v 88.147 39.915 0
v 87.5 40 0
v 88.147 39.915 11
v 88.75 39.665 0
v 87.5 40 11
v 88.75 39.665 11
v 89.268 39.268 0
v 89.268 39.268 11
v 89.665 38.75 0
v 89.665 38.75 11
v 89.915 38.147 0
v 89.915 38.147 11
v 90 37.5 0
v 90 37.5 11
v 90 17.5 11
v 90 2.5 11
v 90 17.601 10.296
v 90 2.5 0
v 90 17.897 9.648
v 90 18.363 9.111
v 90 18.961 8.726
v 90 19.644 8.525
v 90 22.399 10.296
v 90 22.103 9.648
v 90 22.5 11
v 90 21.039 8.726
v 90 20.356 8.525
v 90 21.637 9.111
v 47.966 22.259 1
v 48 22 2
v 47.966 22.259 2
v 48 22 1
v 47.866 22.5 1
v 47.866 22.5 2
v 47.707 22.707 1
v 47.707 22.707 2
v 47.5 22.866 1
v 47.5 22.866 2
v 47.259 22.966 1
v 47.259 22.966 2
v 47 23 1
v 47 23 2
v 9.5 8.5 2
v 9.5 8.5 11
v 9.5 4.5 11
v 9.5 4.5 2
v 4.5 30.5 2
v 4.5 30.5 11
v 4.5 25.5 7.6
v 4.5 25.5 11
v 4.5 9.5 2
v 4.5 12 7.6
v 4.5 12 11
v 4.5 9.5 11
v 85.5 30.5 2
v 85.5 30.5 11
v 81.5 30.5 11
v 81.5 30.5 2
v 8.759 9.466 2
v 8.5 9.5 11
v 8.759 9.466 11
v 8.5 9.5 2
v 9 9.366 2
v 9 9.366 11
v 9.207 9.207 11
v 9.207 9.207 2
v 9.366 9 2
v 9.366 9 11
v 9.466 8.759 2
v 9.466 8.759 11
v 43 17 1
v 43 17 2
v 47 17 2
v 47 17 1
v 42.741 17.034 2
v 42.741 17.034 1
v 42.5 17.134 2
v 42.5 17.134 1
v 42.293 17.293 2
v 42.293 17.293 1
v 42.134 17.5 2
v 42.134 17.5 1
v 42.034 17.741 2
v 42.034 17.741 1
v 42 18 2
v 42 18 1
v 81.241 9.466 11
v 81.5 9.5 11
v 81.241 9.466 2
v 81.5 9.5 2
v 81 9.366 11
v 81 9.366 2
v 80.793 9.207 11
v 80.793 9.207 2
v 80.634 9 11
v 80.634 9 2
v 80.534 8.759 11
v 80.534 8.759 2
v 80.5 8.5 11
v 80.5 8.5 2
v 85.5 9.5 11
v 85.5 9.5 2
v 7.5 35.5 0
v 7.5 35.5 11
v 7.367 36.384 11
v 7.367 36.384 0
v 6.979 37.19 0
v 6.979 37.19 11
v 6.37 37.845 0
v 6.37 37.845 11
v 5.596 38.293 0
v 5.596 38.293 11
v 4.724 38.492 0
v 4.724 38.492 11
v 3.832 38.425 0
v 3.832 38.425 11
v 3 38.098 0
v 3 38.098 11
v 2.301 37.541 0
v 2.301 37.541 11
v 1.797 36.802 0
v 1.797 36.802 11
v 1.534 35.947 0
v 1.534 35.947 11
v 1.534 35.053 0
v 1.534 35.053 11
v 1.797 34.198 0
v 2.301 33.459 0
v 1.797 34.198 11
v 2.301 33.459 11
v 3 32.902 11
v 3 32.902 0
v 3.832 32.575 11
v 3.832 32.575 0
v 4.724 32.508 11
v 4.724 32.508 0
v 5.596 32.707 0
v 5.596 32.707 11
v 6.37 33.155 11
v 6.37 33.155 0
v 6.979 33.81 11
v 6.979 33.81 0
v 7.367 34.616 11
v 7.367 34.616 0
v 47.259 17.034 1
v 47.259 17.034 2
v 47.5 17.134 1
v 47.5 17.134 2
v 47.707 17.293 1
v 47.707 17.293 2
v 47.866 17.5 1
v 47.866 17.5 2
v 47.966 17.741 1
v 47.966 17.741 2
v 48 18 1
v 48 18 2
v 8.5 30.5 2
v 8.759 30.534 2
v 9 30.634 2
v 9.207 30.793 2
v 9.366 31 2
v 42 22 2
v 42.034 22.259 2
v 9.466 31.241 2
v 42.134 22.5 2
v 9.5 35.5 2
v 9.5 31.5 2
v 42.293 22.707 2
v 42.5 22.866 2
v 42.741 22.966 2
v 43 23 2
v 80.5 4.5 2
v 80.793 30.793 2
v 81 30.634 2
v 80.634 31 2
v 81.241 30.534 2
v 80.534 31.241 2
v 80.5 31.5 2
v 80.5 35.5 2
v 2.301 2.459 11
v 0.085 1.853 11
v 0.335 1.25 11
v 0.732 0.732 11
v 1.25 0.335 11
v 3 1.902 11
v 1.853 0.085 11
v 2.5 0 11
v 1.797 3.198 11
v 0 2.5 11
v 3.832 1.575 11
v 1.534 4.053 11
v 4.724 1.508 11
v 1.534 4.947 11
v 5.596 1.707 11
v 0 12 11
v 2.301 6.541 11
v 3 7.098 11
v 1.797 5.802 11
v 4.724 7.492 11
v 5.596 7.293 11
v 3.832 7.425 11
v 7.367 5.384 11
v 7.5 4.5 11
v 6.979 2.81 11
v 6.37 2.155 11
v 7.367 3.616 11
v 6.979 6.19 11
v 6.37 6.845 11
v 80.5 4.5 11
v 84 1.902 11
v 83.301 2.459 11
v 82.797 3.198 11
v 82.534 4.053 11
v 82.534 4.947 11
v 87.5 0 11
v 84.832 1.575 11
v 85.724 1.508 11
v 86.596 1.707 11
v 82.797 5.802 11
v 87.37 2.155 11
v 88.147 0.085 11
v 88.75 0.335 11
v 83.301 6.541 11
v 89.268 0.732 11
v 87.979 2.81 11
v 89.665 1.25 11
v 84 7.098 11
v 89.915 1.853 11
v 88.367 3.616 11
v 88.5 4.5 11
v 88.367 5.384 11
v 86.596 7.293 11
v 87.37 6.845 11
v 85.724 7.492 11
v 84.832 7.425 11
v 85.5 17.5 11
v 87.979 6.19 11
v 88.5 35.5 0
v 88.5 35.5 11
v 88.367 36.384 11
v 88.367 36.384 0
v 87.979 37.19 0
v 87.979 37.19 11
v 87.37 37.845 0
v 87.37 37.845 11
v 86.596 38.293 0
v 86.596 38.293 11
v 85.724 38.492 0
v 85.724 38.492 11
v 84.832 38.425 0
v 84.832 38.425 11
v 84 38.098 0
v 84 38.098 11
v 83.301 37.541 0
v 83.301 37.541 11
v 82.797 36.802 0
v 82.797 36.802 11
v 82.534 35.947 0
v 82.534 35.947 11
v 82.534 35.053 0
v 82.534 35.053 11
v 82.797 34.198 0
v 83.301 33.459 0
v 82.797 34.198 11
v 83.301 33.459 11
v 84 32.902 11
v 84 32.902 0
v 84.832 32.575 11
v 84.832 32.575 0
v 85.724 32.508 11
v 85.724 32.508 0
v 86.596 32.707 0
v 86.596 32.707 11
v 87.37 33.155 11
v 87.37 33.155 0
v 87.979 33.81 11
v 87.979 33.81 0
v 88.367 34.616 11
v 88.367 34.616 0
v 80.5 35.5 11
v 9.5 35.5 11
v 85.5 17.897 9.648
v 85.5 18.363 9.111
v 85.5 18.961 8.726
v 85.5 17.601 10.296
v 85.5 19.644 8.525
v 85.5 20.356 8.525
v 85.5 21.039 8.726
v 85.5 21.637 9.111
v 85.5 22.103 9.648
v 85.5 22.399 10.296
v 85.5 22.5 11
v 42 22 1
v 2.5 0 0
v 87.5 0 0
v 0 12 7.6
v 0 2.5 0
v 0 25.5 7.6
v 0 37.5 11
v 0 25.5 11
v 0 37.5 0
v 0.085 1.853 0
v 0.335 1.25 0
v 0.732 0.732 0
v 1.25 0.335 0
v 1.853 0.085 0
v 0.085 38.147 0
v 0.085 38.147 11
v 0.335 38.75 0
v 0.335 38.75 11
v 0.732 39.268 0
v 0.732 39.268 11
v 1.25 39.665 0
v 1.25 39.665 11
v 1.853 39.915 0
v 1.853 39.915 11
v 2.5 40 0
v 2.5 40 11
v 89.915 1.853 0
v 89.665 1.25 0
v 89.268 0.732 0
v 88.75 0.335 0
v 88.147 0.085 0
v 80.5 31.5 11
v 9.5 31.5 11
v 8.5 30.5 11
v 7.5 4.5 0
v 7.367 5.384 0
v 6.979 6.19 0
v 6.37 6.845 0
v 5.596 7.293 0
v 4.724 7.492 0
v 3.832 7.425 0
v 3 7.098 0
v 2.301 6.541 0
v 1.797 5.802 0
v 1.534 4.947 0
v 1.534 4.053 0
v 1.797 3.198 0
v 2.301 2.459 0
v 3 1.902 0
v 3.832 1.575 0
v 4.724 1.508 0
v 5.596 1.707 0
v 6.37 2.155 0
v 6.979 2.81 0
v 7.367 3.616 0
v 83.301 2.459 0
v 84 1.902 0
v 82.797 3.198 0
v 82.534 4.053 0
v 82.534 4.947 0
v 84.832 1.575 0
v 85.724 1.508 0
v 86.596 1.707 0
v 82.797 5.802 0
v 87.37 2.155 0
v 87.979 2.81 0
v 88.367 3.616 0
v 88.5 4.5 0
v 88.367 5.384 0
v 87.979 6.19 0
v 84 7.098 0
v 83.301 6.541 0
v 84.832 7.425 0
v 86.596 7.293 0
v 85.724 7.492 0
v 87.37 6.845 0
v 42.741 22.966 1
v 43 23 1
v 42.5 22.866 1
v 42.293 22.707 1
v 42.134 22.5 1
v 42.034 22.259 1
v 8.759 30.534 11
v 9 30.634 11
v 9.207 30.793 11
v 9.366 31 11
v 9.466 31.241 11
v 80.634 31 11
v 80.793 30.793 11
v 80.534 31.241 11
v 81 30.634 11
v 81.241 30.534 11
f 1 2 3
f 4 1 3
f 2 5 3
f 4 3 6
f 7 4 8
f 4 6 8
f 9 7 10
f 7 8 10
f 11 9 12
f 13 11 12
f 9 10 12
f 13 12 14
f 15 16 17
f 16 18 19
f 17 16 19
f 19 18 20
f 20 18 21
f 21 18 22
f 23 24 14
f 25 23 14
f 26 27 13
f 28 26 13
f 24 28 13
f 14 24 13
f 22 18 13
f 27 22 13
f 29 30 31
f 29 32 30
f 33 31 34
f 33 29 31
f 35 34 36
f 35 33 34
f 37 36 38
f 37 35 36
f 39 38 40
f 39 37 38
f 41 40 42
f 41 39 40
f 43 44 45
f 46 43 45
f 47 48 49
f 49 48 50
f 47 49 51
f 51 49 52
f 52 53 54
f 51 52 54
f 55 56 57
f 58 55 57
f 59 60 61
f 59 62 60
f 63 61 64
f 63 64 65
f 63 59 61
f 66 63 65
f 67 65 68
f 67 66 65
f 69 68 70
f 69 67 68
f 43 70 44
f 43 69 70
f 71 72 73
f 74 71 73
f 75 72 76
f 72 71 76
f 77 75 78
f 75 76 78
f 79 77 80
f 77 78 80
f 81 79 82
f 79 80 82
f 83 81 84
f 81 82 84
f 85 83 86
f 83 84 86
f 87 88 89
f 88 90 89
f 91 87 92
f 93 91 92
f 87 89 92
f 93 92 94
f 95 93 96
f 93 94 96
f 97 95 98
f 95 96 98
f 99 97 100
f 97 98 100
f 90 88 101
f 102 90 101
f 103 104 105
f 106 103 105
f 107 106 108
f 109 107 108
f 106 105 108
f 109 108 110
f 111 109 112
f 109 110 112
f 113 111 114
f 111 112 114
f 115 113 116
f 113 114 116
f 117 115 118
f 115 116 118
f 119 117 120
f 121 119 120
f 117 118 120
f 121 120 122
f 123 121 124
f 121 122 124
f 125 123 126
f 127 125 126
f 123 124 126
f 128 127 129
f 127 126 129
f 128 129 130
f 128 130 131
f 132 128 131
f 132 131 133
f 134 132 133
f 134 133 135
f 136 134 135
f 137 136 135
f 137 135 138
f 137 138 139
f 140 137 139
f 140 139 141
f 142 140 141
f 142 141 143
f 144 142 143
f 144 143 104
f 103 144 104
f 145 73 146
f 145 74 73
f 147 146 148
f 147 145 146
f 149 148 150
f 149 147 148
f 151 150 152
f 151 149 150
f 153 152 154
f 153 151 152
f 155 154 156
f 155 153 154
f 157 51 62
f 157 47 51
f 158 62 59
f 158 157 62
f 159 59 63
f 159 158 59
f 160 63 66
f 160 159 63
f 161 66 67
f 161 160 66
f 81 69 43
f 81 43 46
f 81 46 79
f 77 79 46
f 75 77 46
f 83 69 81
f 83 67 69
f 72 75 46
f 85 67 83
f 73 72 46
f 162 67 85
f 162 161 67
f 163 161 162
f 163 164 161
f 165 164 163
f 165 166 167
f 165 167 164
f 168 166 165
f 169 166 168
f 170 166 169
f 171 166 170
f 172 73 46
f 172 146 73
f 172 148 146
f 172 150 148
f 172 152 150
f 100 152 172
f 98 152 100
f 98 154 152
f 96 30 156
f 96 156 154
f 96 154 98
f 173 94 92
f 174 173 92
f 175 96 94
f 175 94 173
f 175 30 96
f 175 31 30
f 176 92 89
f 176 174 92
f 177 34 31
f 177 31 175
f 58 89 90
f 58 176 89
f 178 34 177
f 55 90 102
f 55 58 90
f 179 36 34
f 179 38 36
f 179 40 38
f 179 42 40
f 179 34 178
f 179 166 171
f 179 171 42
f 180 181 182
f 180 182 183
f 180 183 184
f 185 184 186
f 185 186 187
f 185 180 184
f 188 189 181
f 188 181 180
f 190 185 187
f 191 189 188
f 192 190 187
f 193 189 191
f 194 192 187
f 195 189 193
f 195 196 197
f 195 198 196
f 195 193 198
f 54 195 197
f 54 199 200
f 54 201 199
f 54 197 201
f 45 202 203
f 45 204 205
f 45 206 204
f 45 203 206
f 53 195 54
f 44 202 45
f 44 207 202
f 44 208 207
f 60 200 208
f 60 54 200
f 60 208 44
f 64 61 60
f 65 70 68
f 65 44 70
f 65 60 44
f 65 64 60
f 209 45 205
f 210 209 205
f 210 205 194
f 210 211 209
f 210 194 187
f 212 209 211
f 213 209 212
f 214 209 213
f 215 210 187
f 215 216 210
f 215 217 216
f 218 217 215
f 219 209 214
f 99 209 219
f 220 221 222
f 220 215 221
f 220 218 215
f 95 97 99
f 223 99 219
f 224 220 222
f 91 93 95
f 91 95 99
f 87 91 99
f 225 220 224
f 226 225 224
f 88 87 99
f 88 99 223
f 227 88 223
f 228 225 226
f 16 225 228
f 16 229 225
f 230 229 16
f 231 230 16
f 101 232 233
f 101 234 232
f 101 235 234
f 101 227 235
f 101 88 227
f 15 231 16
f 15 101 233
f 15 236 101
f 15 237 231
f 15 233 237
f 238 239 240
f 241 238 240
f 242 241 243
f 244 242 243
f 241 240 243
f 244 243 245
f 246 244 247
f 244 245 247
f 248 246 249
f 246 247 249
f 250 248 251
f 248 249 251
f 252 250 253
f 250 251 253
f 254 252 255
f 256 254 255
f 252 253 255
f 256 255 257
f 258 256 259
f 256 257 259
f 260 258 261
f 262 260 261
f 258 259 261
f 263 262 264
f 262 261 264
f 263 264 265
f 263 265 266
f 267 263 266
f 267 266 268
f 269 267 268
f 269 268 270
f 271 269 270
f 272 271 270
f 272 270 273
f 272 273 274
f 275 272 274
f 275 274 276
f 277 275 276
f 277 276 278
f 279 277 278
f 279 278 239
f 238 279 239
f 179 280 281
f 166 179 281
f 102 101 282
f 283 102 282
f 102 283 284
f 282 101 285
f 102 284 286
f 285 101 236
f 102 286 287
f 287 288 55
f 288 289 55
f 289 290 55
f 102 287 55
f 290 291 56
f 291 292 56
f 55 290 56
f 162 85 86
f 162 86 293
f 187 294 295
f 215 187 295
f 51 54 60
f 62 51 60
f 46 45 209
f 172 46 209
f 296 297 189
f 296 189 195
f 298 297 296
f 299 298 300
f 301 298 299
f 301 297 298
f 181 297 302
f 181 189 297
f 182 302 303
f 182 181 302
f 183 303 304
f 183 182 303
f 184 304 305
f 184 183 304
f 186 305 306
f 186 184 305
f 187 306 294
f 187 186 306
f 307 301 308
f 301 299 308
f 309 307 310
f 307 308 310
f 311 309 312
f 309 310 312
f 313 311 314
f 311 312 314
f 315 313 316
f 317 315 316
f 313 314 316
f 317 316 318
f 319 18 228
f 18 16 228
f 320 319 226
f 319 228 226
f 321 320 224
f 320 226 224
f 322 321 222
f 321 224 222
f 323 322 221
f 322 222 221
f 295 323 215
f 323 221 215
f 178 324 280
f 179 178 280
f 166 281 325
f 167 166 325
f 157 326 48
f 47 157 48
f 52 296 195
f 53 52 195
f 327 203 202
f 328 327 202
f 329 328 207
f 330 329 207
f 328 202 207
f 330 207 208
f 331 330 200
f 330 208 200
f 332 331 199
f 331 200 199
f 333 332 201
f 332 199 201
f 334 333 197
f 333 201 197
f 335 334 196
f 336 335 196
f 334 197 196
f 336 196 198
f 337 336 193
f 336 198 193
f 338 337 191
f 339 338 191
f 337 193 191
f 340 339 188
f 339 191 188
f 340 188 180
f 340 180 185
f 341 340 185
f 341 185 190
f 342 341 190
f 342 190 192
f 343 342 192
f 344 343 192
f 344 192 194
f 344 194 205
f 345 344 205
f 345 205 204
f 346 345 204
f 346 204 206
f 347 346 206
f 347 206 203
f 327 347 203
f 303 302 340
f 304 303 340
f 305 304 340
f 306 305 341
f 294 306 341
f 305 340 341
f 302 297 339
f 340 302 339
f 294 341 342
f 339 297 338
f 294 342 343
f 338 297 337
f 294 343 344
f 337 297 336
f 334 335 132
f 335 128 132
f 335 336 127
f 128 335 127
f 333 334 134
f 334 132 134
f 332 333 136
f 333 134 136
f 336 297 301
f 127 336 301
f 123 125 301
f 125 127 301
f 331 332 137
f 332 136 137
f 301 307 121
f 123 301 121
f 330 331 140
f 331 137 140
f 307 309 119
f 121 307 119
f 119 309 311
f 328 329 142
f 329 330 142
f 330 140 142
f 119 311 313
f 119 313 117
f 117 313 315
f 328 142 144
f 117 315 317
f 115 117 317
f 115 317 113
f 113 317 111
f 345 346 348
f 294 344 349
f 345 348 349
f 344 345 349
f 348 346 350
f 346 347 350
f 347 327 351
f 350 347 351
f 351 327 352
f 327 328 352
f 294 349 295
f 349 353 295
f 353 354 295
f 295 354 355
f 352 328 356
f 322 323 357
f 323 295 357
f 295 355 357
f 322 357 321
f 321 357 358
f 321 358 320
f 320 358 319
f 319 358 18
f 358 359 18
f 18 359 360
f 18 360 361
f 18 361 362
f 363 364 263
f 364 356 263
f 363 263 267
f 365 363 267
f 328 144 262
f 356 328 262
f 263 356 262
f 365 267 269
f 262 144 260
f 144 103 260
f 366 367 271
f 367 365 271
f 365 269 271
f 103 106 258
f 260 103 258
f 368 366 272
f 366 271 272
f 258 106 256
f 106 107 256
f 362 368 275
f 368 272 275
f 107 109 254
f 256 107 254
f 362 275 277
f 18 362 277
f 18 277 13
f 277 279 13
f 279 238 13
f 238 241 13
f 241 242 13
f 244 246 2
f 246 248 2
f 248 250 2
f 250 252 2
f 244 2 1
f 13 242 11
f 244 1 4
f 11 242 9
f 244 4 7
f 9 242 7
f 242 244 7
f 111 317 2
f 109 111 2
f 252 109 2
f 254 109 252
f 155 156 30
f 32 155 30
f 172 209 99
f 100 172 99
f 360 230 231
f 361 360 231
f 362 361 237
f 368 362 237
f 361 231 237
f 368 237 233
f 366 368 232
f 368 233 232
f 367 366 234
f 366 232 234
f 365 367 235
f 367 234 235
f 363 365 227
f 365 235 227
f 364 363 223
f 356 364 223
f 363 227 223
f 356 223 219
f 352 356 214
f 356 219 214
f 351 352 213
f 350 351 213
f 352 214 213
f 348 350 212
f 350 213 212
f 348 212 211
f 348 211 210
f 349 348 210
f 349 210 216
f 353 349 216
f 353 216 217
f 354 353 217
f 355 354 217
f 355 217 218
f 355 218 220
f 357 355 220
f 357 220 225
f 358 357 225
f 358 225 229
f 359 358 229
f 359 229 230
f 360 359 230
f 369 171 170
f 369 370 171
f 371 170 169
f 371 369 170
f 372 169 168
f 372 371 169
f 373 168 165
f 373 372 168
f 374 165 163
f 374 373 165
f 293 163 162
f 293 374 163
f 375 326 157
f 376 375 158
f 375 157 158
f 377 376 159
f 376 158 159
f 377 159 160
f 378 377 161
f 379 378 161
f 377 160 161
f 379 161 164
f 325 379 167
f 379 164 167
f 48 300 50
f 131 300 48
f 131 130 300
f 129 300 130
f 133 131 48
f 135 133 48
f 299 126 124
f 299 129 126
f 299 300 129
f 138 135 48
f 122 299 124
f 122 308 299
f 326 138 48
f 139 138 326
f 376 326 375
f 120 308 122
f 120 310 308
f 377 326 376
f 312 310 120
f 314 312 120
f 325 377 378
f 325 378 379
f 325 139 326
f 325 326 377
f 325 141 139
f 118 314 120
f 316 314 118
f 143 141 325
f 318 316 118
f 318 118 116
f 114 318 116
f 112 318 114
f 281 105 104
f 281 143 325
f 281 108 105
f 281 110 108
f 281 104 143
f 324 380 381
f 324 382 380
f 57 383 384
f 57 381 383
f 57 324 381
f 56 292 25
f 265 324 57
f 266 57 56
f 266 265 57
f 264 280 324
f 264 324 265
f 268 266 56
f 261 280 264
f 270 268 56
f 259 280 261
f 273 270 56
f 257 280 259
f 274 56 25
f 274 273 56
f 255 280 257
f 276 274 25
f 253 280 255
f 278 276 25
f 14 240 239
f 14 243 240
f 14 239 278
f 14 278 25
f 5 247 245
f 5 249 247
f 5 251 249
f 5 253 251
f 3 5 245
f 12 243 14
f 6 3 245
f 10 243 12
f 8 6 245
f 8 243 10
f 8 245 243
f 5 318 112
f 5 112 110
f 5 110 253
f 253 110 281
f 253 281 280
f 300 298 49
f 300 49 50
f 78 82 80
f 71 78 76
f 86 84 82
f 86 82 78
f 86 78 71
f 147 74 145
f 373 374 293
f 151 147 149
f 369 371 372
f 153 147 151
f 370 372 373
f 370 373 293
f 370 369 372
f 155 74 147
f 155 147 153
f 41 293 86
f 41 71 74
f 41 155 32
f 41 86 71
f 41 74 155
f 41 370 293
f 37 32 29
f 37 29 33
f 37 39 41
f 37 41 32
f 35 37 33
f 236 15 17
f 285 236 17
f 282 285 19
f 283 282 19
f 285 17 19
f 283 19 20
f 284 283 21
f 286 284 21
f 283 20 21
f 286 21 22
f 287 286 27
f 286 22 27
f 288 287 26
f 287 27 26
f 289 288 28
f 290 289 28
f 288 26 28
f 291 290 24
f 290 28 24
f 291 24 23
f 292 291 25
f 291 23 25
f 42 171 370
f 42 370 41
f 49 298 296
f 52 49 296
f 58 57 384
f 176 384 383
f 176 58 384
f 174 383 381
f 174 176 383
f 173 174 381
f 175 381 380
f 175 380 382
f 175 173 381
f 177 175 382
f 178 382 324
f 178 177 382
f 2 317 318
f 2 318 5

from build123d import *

# Parameters (mm, degrees)
SKETCH_W        = 90
SKETCH_H        = 40
PAD_DEPTH       = 11
POCKET_DEPTH    = 9
POCKET001_DEPTH = 6
SKETCH003_W     = 13.5
SKETCH003_H     = 3.4
POCKET002_DEPTH = 6
SKETCH005_R     = 3
HOLE_DEPTH      = 25
FILLET_R        = 1
FILLET001_R     = 2.5
SKETCH007_W     = 6
SKETCH007_H     = 6
POCKET003_DEPTH = 1
FILLET002_R     = 1


with BuildPart() as part:
    # Sketch → Pad (new body)
    with BuildSketch(Plane.XY):
        with Locations((45, 20)):
            Rectangle(SKETCH_W, SKETCH_H)
    extrude(amount=PAD_DEPTH)

    # Sketch001 (on Face6 of Pad) → Pocket (cut)
    with BuildSketch(Plane.XY.offset(11)):
        Polygon((4.5, 30.5), (4.5, 9.5), (9.5, 9.5), (9.5, 4.5), (80.5, 4.5), (80.5, 9.5), (85.5, 9.5), (85.5, 30.5), (80.5, 30.5), (80.5, 35.5), (9.5, 35.5), (9.5, 30.5), align=None)
    extrude(amount=-POCKET_DEPTH, mode=Mode.SUBTRACT)

    # Sketch002 (on Face6 of Pocket) → Pocket001 (cut)
    with BuildSketch(Plane.YZ.offset(90)):
        with BuildLine():
            ThreePointArc((17.5, 11), (20, 8.499988), (22.5, 11))
            Line((17.5, 11), (22.5, 11))
        make_face()
    extrude(amount=-POCKET001_DEPTH, mode=Mode.SUBTRACT)

    # Sketch003 (on Face1 of Pocket001) → Pocket002 (cut)
    with BuildSketch(Plane(origin=(0, 0, 0), x_dir=(0, -1, 0), z_dir=(-1, 0, 0))):
        with Locations((-18.75, 9.3)):
            Rectangle(SKETCH003_W, SKETCH003_H)
    extrude(amount=-POCKET002_DEPTH, mode=Mode.SUBTRACT)

    # Sketch005 (on Face8 of Pocket002) → Hole (cut)
    with BuildSketch(Plane.XY.offset(11)):
        with Locations((4.5, 35.5)):
            Circle(SKETCH005_R)
        with Locations((4.5, 4.5)):
            Circle(SKETCH005_R)
        with Locations((85.5, 35.5)):
            Circle(SKETCH005_R)
        with Locations((85.5, 4.5)):
            Circle(SKETCH005_R)
    extrude(amount=-HOLE_DEPTH, mode=Mode.SUBTRACT)

    # Fillet
    fillet_edges = [part.edges().sort_by_distance(p)[0] for p in [
        (9.5, 30.5, 6.5),
        (80.5, 30.5, 6.5),
        (9.5, 9.5, 6.5),
        (80.5, 9.5, 6.5),
    ]]
    fillet(fillet_edges, radius=FILLET_R)

    # Fillet001
    fillet001_edges = [part.edges().sort_by_distance(p)[0] for p in [
        (0, 40, 5.5),
        (90, 40, 5.5),
        (90, 0, 5.5),
        (0, 0, 5.5),
    ]]
    fillet(fillet001_edges, radius=FILLET001_R)

    # Sketch007 (on Face25 of Fillet001) → Pocket003 (cut)
    with BuildSketch(Plane.XY.offset(2)):
        with Locations((45, 20)):
            Rectangle(SKETCH007_W, SKETCH007_H)
    extrude(amount=-POCKET003_DEPTH, mode=Mode.SUBTRACT)

    # Fillet002
    fillet002_edges = [part.edges().sort_by_distance(p)[0] for p in [
        (48, 23, 1.5),
        (42, 23, 1.5),
        (42, 17, 1.5),
        (48, 17, 1.5),
    ]]
    fillet(fillet002_edges, radius=FILLET002_R)


solid = part.part
